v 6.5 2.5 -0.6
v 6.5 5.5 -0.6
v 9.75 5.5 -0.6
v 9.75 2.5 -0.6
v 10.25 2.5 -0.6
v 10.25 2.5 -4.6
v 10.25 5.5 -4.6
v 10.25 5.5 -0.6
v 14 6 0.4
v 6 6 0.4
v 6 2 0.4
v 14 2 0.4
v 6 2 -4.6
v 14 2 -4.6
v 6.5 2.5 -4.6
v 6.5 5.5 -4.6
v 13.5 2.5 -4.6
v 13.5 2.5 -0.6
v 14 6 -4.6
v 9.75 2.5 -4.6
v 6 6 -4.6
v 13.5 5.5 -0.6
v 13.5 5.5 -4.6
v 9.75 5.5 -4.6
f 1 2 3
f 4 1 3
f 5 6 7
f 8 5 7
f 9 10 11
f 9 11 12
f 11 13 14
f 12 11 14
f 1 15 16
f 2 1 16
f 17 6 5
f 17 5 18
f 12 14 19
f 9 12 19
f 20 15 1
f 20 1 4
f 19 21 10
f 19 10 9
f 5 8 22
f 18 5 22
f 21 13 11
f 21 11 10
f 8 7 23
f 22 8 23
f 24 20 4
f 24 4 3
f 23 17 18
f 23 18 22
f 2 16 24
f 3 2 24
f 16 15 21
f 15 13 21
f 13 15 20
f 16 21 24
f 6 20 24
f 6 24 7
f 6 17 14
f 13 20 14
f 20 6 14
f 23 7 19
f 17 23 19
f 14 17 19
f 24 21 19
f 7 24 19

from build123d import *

# Parameters (mm, degrees)
BOX015_W     = 3.25
BOX015_H     = 3
BOX015_DEPTH = 4
BOX014_W     = 3.25
BOX014_H     = 3
BOX014_DEPTH = 4
BOX013_W     = 8
BOX013_H     = 4
BOX013_DEPTH = 5


with BuildPart() as cubo015:
    # Box015 → Box015 (new body)
    with BuildSketch(Plane(origin=(10.25, 2.5, -5), x_dir=(1, 0, 0), z_dir=(0, 0, 1))):
        with Locations((1.625, 1.5)):
            Rectangle(BOX015_W, BOX015_H)
    extrude(amount=BOX015_DEPTH)


with BuildPart() as cubo014:
    # Box014 → Box014 (new body)
    with BuildSketch(Plane(origin=(6.5, 2.5, -5), x_dir=(1, 0, 0), z_dir=(0, 0, 1))):
        with Locations((1.625, 1.5)):
            Rectangle(BOX014_W, BOX014_H)
    extrude(amount=BOX014_DEPTH)


with BuildPart() as lt_h:
    # Box013 → Box013 (new body)
    with BuildSketch(Plane(origin=(6, 2, -5), x_dir=(1, 0, 0), z_dir=(0, 0, 1))):
        with Locations((4, 2)):
            Rectangle(BOX013_W, BOX013_H)
    extrude(amount=BOX013_DEPTH)

    # Cut009: cut Cubo014
    add(cubo014.part, mode=Mode.SUBTRACT)

    # Cut010: cut Cubo015
    add(cubo015.part, mode=Mode.SUBTRACT)


with BuildPart() as lt_h_1:
    # Cut010 placement: moved
    add(lt_h.part.moved(Location((0, 0, 0.4))))


solid = lt_h_1.part
